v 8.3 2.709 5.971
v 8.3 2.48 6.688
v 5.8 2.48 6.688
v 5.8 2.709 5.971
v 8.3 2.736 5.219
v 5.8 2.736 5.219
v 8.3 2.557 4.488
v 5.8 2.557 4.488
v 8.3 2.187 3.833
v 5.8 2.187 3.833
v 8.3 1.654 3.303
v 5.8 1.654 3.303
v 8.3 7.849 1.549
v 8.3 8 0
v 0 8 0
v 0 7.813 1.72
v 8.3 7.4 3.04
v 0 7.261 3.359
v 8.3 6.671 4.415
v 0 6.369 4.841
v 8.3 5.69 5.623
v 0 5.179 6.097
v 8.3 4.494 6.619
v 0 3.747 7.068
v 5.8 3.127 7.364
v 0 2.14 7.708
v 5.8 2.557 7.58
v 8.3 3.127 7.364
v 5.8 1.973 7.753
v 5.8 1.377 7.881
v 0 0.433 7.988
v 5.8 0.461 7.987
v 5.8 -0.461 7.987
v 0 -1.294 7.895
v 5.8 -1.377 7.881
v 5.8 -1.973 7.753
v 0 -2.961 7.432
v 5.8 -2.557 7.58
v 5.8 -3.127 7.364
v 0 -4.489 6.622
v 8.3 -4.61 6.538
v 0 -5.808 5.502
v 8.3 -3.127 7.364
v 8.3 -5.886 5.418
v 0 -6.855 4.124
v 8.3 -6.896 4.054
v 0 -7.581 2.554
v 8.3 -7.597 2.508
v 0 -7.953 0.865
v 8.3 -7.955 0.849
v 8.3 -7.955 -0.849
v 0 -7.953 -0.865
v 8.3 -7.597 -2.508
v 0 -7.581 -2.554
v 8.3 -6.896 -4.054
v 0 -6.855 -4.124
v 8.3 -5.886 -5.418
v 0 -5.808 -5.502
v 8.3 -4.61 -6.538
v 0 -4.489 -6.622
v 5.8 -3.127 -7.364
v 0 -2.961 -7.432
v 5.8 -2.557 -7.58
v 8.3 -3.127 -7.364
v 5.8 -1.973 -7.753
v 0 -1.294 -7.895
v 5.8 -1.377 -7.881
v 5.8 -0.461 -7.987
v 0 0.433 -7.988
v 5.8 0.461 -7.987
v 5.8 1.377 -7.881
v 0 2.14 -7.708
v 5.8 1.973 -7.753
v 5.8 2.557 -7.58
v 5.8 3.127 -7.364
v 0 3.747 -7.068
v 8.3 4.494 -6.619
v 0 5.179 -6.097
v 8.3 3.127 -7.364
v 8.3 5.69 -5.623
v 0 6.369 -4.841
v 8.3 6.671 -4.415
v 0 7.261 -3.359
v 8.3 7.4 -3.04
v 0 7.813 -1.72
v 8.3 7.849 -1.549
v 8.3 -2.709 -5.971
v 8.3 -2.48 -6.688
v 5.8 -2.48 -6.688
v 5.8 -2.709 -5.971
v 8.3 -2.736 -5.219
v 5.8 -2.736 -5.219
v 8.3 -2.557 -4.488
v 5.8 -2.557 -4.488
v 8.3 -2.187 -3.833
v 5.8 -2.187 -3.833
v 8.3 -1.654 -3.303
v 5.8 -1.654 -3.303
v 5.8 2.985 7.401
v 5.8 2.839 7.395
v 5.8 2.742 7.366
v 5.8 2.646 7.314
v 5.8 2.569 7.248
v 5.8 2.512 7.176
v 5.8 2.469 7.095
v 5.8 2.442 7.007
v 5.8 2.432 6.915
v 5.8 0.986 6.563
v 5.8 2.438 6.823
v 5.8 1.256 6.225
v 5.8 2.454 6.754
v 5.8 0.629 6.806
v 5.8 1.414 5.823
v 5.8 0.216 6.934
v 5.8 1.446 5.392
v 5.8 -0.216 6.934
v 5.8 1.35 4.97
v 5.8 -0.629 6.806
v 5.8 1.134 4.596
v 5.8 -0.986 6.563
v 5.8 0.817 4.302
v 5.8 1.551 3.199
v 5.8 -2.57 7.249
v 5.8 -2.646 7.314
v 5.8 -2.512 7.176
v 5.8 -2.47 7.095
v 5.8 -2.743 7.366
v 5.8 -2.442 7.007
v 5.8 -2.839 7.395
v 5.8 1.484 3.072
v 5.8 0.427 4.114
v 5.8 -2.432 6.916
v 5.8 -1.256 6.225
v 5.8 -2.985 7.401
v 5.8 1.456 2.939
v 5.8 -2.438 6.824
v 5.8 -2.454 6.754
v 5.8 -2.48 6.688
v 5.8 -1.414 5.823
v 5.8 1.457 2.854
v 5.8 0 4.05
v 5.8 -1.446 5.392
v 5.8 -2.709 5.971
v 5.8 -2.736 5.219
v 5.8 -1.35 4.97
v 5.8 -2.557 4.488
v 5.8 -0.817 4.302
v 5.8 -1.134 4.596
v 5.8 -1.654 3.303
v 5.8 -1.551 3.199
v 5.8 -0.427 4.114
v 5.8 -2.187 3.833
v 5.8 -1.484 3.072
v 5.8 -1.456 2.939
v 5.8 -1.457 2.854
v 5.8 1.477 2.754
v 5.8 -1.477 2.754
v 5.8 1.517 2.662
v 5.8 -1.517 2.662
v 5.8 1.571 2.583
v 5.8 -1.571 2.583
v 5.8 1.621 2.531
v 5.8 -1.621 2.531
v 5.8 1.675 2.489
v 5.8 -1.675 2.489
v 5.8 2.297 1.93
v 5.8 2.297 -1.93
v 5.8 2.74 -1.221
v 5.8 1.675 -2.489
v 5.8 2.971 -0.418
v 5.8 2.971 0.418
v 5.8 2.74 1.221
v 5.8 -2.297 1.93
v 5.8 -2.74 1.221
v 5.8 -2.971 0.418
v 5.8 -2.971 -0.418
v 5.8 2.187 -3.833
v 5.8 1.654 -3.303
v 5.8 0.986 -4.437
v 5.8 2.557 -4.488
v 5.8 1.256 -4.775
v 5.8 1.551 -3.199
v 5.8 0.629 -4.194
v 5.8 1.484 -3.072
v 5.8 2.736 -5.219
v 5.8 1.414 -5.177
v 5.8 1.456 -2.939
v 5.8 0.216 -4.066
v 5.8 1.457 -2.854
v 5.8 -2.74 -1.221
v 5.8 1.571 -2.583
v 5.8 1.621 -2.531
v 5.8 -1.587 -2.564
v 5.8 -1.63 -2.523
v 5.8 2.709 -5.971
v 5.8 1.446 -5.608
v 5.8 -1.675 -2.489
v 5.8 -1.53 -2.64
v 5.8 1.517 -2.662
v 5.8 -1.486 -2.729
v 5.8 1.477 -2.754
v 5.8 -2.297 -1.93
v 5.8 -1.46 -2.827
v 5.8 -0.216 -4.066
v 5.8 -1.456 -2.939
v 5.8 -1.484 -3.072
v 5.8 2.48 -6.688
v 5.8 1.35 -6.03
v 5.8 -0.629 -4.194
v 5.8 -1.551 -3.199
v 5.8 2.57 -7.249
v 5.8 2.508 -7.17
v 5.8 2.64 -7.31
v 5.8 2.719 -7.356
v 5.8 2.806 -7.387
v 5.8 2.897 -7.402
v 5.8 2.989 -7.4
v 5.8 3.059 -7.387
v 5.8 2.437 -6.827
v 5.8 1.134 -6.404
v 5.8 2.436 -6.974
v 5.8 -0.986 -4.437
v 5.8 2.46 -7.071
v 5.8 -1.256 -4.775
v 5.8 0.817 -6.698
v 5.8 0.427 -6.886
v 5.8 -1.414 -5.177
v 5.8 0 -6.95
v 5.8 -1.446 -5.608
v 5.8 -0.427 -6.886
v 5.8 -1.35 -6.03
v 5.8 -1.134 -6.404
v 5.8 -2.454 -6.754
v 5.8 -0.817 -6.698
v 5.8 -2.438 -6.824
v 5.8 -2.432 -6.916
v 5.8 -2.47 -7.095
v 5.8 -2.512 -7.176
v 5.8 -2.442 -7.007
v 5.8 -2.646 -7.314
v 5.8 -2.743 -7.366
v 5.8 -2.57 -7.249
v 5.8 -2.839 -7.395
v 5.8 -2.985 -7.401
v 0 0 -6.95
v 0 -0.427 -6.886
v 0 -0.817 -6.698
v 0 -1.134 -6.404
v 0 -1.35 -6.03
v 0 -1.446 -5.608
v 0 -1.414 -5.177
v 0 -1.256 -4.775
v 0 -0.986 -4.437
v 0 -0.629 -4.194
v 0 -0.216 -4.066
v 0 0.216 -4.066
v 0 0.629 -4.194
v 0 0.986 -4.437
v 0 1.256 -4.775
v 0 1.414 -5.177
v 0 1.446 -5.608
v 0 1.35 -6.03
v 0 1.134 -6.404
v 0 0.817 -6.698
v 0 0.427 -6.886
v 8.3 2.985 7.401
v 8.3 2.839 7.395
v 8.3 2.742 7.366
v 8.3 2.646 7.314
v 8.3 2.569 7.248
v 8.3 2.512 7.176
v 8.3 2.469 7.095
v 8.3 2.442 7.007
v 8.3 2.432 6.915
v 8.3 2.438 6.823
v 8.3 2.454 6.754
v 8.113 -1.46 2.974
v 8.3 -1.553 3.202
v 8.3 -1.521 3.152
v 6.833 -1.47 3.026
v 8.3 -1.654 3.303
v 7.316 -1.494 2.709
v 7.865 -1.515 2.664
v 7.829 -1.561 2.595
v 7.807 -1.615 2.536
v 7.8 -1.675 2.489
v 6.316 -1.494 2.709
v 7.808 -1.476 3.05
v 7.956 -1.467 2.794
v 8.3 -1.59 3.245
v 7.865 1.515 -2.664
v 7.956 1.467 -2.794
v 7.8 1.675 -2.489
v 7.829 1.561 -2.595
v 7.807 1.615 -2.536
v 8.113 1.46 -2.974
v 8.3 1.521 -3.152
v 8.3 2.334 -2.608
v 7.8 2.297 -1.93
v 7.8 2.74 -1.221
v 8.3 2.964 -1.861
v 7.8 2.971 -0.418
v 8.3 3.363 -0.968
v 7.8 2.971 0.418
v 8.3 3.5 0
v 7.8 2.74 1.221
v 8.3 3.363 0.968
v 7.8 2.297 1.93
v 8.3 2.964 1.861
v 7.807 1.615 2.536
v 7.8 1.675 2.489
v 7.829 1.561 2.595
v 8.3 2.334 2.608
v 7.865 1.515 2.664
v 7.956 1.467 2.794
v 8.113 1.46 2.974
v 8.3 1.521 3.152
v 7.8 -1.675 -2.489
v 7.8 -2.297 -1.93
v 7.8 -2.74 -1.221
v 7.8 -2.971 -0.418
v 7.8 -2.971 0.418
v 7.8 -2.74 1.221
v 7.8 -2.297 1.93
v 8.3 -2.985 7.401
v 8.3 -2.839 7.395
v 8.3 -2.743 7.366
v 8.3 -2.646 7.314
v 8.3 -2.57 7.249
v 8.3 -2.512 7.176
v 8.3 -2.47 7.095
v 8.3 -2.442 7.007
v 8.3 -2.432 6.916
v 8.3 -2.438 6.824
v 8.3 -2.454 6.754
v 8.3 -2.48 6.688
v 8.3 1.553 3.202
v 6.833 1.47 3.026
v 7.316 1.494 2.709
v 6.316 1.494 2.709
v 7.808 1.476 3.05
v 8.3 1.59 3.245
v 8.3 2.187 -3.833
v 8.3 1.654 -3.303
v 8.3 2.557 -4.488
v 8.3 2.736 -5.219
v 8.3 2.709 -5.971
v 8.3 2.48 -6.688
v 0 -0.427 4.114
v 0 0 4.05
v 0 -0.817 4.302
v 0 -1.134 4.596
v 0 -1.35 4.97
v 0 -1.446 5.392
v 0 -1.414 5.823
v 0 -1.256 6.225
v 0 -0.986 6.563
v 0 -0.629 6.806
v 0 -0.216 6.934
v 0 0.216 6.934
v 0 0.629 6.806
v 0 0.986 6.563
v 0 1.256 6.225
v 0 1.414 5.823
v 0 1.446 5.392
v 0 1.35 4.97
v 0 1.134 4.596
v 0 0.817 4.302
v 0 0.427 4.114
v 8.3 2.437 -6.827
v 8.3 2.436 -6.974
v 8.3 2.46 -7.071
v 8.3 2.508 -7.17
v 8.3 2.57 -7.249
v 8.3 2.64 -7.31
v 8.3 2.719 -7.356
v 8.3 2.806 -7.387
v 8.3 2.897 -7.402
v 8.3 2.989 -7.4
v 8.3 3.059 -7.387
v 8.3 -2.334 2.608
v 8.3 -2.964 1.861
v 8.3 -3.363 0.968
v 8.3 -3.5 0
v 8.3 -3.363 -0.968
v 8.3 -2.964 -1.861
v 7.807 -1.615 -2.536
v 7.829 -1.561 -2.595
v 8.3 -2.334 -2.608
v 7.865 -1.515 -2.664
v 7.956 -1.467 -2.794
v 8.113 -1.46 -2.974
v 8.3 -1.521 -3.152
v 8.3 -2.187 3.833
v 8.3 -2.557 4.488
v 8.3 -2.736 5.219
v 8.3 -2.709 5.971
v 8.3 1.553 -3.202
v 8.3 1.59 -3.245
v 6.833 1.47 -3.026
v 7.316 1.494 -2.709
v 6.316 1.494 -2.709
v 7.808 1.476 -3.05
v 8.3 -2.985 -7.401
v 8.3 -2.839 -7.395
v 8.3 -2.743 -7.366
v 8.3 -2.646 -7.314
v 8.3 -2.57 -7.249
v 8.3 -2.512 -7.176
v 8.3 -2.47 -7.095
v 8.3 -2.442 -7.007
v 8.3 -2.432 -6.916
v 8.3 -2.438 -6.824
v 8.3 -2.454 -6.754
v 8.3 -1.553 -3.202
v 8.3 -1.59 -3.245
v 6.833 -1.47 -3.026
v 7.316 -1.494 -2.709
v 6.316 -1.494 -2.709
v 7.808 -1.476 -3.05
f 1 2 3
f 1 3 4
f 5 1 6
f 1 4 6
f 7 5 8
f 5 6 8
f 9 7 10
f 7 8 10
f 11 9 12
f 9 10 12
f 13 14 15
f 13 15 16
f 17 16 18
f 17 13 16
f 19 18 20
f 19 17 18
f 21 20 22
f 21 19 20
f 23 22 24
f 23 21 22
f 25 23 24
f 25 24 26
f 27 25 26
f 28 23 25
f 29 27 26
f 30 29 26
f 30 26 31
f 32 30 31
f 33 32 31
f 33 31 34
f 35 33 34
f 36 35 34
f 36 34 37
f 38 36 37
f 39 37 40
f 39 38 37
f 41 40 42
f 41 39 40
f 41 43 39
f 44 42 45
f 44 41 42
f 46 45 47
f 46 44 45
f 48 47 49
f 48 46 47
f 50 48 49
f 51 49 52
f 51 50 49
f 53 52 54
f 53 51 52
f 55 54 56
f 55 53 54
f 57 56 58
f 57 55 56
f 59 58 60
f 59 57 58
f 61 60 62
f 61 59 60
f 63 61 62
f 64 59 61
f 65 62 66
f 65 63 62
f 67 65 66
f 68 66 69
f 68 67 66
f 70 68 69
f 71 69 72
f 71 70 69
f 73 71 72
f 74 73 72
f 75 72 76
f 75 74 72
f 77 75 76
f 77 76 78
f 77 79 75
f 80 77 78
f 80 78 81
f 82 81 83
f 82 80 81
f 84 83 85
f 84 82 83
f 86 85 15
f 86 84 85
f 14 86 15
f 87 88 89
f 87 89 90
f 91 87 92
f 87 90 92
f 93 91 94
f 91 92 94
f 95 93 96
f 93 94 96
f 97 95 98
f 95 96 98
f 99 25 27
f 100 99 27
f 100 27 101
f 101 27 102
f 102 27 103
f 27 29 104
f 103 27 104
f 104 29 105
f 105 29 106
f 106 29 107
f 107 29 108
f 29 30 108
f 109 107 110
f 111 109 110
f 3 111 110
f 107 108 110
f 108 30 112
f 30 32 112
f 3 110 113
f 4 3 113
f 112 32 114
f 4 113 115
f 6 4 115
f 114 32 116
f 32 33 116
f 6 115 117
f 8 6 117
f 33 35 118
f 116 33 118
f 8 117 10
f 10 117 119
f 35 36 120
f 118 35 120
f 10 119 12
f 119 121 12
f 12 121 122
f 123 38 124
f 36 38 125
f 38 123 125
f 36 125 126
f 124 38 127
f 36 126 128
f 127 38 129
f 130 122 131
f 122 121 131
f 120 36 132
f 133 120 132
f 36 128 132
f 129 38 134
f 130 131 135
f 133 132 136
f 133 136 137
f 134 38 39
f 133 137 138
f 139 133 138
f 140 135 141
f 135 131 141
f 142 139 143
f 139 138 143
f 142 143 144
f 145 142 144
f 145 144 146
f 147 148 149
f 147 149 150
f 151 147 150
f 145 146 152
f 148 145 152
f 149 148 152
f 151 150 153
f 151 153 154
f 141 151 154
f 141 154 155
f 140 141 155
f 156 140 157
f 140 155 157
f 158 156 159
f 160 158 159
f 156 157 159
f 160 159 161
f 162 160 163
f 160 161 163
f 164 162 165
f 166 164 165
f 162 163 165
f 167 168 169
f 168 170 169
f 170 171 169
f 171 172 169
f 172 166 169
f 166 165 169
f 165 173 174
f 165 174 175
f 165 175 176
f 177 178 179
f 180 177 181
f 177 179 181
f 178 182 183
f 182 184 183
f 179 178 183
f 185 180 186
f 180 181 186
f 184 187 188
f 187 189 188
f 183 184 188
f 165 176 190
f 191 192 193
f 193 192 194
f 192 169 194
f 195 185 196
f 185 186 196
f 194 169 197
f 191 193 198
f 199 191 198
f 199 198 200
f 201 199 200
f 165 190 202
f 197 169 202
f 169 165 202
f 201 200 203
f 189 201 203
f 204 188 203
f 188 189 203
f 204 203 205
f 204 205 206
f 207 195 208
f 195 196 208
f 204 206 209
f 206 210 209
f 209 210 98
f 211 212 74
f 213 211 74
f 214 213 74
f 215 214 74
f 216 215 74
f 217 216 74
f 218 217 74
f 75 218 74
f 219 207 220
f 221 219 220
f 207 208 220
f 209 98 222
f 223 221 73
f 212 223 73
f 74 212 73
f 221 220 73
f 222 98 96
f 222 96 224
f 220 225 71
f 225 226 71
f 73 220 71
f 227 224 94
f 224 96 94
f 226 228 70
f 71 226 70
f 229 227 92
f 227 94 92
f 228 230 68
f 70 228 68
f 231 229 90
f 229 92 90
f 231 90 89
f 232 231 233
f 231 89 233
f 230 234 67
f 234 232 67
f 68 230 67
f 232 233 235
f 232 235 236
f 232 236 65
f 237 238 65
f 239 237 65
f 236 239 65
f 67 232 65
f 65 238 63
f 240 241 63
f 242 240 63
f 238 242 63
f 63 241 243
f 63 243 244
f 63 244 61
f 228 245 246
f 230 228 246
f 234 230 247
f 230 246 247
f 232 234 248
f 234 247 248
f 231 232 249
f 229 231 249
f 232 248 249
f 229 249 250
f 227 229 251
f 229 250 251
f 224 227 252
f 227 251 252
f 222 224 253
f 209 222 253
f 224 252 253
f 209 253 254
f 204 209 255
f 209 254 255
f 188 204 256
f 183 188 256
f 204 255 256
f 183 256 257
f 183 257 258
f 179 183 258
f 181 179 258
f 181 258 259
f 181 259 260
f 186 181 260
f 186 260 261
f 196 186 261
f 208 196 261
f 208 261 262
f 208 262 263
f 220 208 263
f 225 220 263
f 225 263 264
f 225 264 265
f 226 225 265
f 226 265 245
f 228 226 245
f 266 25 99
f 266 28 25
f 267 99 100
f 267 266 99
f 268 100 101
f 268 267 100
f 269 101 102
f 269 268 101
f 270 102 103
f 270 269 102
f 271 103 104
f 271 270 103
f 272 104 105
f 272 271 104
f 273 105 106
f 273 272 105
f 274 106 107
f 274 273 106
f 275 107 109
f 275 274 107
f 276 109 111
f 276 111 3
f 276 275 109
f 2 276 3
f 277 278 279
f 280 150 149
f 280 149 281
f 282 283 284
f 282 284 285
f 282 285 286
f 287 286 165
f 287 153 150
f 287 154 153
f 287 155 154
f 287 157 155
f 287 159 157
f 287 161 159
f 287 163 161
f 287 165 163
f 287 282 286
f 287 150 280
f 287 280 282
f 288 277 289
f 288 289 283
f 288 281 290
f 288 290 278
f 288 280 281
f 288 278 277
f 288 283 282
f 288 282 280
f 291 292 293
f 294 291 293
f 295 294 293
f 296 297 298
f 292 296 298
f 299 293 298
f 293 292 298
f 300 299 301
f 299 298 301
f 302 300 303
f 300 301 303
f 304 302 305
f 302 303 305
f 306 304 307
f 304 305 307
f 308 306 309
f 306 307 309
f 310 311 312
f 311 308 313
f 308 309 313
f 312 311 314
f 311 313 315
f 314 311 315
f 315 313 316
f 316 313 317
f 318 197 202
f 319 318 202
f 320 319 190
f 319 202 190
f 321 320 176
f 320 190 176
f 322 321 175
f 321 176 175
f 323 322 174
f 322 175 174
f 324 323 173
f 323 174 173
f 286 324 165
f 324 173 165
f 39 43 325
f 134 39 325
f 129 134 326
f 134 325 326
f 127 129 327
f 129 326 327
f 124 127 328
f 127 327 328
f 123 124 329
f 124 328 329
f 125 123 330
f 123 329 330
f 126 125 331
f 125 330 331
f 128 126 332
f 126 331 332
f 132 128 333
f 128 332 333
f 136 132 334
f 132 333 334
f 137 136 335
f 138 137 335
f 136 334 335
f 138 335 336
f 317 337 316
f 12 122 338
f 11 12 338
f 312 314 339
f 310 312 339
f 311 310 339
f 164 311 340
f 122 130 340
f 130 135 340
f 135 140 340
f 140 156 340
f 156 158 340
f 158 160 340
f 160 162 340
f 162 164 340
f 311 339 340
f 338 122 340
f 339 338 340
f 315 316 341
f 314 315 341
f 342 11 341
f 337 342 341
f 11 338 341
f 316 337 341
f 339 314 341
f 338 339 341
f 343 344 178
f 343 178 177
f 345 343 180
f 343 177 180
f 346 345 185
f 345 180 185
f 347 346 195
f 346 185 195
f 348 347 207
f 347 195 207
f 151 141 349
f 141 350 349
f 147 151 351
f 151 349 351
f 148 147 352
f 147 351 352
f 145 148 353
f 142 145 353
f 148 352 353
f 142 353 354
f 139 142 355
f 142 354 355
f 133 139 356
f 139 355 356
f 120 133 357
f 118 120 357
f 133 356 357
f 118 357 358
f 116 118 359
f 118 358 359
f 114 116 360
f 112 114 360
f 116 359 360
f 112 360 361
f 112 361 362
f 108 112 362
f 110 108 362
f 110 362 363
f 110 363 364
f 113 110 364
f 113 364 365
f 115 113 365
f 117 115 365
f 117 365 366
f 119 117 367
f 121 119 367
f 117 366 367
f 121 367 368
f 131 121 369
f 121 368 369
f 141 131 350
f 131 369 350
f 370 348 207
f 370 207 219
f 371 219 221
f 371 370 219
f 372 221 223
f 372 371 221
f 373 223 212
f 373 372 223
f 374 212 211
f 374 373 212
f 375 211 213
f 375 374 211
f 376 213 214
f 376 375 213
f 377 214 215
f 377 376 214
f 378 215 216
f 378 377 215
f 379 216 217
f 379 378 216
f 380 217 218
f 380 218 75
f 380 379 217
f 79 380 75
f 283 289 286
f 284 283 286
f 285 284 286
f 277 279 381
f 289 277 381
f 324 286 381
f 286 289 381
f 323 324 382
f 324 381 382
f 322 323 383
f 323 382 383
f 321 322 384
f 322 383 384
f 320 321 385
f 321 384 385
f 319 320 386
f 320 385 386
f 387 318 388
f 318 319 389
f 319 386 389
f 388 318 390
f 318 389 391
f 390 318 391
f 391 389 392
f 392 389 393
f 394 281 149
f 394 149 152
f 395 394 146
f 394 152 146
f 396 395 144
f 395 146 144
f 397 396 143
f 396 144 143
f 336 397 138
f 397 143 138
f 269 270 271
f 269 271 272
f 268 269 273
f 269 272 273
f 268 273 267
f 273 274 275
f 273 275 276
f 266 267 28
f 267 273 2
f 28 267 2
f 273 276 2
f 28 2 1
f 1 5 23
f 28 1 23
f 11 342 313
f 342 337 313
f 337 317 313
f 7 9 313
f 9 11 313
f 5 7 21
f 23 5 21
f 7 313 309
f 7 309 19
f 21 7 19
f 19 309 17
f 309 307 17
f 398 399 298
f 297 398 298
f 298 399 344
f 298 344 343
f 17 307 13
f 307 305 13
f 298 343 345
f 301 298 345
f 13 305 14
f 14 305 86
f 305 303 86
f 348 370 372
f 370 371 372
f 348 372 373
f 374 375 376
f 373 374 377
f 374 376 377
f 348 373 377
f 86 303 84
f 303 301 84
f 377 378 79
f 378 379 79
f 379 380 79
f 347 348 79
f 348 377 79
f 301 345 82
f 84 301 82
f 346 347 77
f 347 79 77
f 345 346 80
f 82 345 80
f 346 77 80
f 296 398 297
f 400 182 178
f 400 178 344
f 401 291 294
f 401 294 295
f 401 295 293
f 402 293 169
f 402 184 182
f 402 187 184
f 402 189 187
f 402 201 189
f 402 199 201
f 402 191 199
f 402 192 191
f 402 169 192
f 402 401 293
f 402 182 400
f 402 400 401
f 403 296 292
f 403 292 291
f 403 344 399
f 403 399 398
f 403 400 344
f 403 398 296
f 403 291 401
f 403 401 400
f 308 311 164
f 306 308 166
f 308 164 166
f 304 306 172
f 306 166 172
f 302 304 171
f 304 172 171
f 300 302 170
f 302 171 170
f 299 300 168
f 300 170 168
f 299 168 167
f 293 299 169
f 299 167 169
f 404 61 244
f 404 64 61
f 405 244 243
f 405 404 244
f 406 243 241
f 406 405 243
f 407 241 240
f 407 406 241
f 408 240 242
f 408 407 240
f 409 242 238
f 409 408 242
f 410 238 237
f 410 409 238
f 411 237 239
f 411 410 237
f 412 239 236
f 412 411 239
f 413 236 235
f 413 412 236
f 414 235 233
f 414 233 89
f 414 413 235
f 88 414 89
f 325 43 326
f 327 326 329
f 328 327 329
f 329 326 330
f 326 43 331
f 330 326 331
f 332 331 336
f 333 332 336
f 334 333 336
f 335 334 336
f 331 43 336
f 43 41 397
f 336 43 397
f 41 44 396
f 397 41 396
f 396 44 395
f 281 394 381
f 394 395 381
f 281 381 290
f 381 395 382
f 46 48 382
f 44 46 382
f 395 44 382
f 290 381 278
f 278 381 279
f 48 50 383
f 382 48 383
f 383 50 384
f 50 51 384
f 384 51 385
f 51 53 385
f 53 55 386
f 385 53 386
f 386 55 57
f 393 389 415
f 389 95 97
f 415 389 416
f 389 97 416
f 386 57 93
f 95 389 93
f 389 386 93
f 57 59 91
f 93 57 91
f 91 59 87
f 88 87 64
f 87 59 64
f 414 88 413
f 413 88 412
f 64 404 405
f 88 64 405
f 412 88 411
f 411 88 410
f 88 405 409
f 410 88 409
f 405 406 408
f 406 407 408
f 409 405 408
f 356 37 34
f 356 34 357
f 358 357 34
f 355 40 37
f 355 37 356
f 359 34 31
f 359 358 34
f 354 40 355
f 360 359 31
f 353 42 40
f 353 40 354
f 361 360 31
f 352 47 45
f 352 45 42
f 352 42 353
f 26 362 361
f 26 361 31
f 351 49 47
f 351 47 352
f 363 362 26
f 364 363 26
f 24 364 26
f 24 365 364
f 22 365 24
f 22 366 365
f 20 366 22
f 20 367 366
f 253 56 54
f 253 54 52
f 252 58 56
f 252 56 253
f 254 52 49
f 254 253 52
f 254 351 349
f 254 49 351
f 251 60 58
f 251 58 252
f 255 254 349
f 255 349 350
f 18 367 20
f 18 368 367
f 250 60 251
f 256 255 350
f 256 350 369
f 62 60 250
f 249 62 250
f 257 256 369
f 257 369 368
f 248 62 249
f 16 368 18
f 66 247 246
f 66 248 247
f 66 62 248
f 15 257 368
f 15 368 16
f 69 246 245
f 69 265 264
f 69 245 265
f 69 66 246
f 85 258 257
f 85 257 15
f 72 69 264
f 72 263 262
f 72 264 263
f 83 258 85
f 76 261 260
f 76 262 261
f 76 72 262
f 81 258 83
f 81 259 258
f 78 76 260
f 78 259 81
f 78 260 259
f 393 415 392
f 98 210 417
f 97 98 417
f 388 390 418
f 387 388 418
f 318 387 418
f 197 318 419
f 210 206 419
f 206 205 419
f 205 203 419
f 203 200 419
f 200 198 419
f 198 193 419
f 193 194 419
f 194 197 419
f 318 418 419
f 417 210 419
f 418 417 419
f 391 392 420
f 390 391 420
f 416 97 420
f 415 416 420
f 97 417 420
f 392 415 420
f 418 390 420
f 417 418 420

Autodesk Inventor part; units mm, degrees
ref_plane "YZ Plane" through (0, 0, 0) normal (1, 0, 0) x (0, 1, 0)
ref_plane "XZ Plane" through (0, 0, 0) normal (0, 1, 0) x (-1, 0, 0)
ref_plane "XY Plane" through (0, 0, 0) normal (0, 0, 1) x (1, 0, 0)
sketch "スケッチ1" plane through (0, 0, 0) normal (0, 0, 1) x (1, 0, 0)
  line L0 (0, 0) -> (0, 3.5)
  line L1 (0, 3.5) -> (0, 3.5)
  line L2 (0, 3.5) -> (0, 8)
  line L3 (0, 8) -> (8.3, 8)
  line L4 (8.3, 8) -> (8.3, 3)
  line L5 (8.3, 3) -> (5.8, 3)
  line L6 (5.8, 3) -> (5.8, 0)
  line L7 (5.8, 0) -> (0, 0)
  dimension "d0" = 3.5
  dimension "d1" = 3
  dimension "d2" = 2.5
  dimension "d4" = 0
  dimension "d5" = 8
  dimension "d34" = 5.8
revolve "回転1" add sketch "スケッチ1" angle 360 about axis through (5.8, 0, 0) along (-1, 0, 0)
sketch "スケッチ2" plane through (8.3, 0, 0) normal (1, 0, 0) x (0, 0, -1)
  point P0 (0, 0)
  point P1 (-5.5, 0)
  point P2 (5.5, 0)
  dimension "d10" = 5.5
  dimension "d11" = 5.5
hole "穴1" at (8.3, 0, 5.5) at (8.3, 0, -5.5) direction (-1, 0, 0) diameter 2.9 end through all counterbore diameter 5.5 counterbore depth 2.5 clearance for "Socket Head Cap Screw" size "M2.5" standard "Ansi Metric M Profile"
chamfer "面取り5" distance 0.5 angle 45 2 edges at (8.3, 3, 0) (8.3, -3, 0)
fillet "フィレット2" radius 0.5 8 edges at (6.8, 0.8377, -2.8807) (6.8, 0.8377, 2.8807) (6.8, -0.8377, 2.8807) (6.8, -0.8377, -2.8807) (7.05, 1.3765, -7.8807) (7.05, 1.3765, 7.8807) (7.05, -1.3765, 7.8807) (7.05, -1.3765, -7.8807)
properties part number "scara-base21" material "ABS プラスチック"
